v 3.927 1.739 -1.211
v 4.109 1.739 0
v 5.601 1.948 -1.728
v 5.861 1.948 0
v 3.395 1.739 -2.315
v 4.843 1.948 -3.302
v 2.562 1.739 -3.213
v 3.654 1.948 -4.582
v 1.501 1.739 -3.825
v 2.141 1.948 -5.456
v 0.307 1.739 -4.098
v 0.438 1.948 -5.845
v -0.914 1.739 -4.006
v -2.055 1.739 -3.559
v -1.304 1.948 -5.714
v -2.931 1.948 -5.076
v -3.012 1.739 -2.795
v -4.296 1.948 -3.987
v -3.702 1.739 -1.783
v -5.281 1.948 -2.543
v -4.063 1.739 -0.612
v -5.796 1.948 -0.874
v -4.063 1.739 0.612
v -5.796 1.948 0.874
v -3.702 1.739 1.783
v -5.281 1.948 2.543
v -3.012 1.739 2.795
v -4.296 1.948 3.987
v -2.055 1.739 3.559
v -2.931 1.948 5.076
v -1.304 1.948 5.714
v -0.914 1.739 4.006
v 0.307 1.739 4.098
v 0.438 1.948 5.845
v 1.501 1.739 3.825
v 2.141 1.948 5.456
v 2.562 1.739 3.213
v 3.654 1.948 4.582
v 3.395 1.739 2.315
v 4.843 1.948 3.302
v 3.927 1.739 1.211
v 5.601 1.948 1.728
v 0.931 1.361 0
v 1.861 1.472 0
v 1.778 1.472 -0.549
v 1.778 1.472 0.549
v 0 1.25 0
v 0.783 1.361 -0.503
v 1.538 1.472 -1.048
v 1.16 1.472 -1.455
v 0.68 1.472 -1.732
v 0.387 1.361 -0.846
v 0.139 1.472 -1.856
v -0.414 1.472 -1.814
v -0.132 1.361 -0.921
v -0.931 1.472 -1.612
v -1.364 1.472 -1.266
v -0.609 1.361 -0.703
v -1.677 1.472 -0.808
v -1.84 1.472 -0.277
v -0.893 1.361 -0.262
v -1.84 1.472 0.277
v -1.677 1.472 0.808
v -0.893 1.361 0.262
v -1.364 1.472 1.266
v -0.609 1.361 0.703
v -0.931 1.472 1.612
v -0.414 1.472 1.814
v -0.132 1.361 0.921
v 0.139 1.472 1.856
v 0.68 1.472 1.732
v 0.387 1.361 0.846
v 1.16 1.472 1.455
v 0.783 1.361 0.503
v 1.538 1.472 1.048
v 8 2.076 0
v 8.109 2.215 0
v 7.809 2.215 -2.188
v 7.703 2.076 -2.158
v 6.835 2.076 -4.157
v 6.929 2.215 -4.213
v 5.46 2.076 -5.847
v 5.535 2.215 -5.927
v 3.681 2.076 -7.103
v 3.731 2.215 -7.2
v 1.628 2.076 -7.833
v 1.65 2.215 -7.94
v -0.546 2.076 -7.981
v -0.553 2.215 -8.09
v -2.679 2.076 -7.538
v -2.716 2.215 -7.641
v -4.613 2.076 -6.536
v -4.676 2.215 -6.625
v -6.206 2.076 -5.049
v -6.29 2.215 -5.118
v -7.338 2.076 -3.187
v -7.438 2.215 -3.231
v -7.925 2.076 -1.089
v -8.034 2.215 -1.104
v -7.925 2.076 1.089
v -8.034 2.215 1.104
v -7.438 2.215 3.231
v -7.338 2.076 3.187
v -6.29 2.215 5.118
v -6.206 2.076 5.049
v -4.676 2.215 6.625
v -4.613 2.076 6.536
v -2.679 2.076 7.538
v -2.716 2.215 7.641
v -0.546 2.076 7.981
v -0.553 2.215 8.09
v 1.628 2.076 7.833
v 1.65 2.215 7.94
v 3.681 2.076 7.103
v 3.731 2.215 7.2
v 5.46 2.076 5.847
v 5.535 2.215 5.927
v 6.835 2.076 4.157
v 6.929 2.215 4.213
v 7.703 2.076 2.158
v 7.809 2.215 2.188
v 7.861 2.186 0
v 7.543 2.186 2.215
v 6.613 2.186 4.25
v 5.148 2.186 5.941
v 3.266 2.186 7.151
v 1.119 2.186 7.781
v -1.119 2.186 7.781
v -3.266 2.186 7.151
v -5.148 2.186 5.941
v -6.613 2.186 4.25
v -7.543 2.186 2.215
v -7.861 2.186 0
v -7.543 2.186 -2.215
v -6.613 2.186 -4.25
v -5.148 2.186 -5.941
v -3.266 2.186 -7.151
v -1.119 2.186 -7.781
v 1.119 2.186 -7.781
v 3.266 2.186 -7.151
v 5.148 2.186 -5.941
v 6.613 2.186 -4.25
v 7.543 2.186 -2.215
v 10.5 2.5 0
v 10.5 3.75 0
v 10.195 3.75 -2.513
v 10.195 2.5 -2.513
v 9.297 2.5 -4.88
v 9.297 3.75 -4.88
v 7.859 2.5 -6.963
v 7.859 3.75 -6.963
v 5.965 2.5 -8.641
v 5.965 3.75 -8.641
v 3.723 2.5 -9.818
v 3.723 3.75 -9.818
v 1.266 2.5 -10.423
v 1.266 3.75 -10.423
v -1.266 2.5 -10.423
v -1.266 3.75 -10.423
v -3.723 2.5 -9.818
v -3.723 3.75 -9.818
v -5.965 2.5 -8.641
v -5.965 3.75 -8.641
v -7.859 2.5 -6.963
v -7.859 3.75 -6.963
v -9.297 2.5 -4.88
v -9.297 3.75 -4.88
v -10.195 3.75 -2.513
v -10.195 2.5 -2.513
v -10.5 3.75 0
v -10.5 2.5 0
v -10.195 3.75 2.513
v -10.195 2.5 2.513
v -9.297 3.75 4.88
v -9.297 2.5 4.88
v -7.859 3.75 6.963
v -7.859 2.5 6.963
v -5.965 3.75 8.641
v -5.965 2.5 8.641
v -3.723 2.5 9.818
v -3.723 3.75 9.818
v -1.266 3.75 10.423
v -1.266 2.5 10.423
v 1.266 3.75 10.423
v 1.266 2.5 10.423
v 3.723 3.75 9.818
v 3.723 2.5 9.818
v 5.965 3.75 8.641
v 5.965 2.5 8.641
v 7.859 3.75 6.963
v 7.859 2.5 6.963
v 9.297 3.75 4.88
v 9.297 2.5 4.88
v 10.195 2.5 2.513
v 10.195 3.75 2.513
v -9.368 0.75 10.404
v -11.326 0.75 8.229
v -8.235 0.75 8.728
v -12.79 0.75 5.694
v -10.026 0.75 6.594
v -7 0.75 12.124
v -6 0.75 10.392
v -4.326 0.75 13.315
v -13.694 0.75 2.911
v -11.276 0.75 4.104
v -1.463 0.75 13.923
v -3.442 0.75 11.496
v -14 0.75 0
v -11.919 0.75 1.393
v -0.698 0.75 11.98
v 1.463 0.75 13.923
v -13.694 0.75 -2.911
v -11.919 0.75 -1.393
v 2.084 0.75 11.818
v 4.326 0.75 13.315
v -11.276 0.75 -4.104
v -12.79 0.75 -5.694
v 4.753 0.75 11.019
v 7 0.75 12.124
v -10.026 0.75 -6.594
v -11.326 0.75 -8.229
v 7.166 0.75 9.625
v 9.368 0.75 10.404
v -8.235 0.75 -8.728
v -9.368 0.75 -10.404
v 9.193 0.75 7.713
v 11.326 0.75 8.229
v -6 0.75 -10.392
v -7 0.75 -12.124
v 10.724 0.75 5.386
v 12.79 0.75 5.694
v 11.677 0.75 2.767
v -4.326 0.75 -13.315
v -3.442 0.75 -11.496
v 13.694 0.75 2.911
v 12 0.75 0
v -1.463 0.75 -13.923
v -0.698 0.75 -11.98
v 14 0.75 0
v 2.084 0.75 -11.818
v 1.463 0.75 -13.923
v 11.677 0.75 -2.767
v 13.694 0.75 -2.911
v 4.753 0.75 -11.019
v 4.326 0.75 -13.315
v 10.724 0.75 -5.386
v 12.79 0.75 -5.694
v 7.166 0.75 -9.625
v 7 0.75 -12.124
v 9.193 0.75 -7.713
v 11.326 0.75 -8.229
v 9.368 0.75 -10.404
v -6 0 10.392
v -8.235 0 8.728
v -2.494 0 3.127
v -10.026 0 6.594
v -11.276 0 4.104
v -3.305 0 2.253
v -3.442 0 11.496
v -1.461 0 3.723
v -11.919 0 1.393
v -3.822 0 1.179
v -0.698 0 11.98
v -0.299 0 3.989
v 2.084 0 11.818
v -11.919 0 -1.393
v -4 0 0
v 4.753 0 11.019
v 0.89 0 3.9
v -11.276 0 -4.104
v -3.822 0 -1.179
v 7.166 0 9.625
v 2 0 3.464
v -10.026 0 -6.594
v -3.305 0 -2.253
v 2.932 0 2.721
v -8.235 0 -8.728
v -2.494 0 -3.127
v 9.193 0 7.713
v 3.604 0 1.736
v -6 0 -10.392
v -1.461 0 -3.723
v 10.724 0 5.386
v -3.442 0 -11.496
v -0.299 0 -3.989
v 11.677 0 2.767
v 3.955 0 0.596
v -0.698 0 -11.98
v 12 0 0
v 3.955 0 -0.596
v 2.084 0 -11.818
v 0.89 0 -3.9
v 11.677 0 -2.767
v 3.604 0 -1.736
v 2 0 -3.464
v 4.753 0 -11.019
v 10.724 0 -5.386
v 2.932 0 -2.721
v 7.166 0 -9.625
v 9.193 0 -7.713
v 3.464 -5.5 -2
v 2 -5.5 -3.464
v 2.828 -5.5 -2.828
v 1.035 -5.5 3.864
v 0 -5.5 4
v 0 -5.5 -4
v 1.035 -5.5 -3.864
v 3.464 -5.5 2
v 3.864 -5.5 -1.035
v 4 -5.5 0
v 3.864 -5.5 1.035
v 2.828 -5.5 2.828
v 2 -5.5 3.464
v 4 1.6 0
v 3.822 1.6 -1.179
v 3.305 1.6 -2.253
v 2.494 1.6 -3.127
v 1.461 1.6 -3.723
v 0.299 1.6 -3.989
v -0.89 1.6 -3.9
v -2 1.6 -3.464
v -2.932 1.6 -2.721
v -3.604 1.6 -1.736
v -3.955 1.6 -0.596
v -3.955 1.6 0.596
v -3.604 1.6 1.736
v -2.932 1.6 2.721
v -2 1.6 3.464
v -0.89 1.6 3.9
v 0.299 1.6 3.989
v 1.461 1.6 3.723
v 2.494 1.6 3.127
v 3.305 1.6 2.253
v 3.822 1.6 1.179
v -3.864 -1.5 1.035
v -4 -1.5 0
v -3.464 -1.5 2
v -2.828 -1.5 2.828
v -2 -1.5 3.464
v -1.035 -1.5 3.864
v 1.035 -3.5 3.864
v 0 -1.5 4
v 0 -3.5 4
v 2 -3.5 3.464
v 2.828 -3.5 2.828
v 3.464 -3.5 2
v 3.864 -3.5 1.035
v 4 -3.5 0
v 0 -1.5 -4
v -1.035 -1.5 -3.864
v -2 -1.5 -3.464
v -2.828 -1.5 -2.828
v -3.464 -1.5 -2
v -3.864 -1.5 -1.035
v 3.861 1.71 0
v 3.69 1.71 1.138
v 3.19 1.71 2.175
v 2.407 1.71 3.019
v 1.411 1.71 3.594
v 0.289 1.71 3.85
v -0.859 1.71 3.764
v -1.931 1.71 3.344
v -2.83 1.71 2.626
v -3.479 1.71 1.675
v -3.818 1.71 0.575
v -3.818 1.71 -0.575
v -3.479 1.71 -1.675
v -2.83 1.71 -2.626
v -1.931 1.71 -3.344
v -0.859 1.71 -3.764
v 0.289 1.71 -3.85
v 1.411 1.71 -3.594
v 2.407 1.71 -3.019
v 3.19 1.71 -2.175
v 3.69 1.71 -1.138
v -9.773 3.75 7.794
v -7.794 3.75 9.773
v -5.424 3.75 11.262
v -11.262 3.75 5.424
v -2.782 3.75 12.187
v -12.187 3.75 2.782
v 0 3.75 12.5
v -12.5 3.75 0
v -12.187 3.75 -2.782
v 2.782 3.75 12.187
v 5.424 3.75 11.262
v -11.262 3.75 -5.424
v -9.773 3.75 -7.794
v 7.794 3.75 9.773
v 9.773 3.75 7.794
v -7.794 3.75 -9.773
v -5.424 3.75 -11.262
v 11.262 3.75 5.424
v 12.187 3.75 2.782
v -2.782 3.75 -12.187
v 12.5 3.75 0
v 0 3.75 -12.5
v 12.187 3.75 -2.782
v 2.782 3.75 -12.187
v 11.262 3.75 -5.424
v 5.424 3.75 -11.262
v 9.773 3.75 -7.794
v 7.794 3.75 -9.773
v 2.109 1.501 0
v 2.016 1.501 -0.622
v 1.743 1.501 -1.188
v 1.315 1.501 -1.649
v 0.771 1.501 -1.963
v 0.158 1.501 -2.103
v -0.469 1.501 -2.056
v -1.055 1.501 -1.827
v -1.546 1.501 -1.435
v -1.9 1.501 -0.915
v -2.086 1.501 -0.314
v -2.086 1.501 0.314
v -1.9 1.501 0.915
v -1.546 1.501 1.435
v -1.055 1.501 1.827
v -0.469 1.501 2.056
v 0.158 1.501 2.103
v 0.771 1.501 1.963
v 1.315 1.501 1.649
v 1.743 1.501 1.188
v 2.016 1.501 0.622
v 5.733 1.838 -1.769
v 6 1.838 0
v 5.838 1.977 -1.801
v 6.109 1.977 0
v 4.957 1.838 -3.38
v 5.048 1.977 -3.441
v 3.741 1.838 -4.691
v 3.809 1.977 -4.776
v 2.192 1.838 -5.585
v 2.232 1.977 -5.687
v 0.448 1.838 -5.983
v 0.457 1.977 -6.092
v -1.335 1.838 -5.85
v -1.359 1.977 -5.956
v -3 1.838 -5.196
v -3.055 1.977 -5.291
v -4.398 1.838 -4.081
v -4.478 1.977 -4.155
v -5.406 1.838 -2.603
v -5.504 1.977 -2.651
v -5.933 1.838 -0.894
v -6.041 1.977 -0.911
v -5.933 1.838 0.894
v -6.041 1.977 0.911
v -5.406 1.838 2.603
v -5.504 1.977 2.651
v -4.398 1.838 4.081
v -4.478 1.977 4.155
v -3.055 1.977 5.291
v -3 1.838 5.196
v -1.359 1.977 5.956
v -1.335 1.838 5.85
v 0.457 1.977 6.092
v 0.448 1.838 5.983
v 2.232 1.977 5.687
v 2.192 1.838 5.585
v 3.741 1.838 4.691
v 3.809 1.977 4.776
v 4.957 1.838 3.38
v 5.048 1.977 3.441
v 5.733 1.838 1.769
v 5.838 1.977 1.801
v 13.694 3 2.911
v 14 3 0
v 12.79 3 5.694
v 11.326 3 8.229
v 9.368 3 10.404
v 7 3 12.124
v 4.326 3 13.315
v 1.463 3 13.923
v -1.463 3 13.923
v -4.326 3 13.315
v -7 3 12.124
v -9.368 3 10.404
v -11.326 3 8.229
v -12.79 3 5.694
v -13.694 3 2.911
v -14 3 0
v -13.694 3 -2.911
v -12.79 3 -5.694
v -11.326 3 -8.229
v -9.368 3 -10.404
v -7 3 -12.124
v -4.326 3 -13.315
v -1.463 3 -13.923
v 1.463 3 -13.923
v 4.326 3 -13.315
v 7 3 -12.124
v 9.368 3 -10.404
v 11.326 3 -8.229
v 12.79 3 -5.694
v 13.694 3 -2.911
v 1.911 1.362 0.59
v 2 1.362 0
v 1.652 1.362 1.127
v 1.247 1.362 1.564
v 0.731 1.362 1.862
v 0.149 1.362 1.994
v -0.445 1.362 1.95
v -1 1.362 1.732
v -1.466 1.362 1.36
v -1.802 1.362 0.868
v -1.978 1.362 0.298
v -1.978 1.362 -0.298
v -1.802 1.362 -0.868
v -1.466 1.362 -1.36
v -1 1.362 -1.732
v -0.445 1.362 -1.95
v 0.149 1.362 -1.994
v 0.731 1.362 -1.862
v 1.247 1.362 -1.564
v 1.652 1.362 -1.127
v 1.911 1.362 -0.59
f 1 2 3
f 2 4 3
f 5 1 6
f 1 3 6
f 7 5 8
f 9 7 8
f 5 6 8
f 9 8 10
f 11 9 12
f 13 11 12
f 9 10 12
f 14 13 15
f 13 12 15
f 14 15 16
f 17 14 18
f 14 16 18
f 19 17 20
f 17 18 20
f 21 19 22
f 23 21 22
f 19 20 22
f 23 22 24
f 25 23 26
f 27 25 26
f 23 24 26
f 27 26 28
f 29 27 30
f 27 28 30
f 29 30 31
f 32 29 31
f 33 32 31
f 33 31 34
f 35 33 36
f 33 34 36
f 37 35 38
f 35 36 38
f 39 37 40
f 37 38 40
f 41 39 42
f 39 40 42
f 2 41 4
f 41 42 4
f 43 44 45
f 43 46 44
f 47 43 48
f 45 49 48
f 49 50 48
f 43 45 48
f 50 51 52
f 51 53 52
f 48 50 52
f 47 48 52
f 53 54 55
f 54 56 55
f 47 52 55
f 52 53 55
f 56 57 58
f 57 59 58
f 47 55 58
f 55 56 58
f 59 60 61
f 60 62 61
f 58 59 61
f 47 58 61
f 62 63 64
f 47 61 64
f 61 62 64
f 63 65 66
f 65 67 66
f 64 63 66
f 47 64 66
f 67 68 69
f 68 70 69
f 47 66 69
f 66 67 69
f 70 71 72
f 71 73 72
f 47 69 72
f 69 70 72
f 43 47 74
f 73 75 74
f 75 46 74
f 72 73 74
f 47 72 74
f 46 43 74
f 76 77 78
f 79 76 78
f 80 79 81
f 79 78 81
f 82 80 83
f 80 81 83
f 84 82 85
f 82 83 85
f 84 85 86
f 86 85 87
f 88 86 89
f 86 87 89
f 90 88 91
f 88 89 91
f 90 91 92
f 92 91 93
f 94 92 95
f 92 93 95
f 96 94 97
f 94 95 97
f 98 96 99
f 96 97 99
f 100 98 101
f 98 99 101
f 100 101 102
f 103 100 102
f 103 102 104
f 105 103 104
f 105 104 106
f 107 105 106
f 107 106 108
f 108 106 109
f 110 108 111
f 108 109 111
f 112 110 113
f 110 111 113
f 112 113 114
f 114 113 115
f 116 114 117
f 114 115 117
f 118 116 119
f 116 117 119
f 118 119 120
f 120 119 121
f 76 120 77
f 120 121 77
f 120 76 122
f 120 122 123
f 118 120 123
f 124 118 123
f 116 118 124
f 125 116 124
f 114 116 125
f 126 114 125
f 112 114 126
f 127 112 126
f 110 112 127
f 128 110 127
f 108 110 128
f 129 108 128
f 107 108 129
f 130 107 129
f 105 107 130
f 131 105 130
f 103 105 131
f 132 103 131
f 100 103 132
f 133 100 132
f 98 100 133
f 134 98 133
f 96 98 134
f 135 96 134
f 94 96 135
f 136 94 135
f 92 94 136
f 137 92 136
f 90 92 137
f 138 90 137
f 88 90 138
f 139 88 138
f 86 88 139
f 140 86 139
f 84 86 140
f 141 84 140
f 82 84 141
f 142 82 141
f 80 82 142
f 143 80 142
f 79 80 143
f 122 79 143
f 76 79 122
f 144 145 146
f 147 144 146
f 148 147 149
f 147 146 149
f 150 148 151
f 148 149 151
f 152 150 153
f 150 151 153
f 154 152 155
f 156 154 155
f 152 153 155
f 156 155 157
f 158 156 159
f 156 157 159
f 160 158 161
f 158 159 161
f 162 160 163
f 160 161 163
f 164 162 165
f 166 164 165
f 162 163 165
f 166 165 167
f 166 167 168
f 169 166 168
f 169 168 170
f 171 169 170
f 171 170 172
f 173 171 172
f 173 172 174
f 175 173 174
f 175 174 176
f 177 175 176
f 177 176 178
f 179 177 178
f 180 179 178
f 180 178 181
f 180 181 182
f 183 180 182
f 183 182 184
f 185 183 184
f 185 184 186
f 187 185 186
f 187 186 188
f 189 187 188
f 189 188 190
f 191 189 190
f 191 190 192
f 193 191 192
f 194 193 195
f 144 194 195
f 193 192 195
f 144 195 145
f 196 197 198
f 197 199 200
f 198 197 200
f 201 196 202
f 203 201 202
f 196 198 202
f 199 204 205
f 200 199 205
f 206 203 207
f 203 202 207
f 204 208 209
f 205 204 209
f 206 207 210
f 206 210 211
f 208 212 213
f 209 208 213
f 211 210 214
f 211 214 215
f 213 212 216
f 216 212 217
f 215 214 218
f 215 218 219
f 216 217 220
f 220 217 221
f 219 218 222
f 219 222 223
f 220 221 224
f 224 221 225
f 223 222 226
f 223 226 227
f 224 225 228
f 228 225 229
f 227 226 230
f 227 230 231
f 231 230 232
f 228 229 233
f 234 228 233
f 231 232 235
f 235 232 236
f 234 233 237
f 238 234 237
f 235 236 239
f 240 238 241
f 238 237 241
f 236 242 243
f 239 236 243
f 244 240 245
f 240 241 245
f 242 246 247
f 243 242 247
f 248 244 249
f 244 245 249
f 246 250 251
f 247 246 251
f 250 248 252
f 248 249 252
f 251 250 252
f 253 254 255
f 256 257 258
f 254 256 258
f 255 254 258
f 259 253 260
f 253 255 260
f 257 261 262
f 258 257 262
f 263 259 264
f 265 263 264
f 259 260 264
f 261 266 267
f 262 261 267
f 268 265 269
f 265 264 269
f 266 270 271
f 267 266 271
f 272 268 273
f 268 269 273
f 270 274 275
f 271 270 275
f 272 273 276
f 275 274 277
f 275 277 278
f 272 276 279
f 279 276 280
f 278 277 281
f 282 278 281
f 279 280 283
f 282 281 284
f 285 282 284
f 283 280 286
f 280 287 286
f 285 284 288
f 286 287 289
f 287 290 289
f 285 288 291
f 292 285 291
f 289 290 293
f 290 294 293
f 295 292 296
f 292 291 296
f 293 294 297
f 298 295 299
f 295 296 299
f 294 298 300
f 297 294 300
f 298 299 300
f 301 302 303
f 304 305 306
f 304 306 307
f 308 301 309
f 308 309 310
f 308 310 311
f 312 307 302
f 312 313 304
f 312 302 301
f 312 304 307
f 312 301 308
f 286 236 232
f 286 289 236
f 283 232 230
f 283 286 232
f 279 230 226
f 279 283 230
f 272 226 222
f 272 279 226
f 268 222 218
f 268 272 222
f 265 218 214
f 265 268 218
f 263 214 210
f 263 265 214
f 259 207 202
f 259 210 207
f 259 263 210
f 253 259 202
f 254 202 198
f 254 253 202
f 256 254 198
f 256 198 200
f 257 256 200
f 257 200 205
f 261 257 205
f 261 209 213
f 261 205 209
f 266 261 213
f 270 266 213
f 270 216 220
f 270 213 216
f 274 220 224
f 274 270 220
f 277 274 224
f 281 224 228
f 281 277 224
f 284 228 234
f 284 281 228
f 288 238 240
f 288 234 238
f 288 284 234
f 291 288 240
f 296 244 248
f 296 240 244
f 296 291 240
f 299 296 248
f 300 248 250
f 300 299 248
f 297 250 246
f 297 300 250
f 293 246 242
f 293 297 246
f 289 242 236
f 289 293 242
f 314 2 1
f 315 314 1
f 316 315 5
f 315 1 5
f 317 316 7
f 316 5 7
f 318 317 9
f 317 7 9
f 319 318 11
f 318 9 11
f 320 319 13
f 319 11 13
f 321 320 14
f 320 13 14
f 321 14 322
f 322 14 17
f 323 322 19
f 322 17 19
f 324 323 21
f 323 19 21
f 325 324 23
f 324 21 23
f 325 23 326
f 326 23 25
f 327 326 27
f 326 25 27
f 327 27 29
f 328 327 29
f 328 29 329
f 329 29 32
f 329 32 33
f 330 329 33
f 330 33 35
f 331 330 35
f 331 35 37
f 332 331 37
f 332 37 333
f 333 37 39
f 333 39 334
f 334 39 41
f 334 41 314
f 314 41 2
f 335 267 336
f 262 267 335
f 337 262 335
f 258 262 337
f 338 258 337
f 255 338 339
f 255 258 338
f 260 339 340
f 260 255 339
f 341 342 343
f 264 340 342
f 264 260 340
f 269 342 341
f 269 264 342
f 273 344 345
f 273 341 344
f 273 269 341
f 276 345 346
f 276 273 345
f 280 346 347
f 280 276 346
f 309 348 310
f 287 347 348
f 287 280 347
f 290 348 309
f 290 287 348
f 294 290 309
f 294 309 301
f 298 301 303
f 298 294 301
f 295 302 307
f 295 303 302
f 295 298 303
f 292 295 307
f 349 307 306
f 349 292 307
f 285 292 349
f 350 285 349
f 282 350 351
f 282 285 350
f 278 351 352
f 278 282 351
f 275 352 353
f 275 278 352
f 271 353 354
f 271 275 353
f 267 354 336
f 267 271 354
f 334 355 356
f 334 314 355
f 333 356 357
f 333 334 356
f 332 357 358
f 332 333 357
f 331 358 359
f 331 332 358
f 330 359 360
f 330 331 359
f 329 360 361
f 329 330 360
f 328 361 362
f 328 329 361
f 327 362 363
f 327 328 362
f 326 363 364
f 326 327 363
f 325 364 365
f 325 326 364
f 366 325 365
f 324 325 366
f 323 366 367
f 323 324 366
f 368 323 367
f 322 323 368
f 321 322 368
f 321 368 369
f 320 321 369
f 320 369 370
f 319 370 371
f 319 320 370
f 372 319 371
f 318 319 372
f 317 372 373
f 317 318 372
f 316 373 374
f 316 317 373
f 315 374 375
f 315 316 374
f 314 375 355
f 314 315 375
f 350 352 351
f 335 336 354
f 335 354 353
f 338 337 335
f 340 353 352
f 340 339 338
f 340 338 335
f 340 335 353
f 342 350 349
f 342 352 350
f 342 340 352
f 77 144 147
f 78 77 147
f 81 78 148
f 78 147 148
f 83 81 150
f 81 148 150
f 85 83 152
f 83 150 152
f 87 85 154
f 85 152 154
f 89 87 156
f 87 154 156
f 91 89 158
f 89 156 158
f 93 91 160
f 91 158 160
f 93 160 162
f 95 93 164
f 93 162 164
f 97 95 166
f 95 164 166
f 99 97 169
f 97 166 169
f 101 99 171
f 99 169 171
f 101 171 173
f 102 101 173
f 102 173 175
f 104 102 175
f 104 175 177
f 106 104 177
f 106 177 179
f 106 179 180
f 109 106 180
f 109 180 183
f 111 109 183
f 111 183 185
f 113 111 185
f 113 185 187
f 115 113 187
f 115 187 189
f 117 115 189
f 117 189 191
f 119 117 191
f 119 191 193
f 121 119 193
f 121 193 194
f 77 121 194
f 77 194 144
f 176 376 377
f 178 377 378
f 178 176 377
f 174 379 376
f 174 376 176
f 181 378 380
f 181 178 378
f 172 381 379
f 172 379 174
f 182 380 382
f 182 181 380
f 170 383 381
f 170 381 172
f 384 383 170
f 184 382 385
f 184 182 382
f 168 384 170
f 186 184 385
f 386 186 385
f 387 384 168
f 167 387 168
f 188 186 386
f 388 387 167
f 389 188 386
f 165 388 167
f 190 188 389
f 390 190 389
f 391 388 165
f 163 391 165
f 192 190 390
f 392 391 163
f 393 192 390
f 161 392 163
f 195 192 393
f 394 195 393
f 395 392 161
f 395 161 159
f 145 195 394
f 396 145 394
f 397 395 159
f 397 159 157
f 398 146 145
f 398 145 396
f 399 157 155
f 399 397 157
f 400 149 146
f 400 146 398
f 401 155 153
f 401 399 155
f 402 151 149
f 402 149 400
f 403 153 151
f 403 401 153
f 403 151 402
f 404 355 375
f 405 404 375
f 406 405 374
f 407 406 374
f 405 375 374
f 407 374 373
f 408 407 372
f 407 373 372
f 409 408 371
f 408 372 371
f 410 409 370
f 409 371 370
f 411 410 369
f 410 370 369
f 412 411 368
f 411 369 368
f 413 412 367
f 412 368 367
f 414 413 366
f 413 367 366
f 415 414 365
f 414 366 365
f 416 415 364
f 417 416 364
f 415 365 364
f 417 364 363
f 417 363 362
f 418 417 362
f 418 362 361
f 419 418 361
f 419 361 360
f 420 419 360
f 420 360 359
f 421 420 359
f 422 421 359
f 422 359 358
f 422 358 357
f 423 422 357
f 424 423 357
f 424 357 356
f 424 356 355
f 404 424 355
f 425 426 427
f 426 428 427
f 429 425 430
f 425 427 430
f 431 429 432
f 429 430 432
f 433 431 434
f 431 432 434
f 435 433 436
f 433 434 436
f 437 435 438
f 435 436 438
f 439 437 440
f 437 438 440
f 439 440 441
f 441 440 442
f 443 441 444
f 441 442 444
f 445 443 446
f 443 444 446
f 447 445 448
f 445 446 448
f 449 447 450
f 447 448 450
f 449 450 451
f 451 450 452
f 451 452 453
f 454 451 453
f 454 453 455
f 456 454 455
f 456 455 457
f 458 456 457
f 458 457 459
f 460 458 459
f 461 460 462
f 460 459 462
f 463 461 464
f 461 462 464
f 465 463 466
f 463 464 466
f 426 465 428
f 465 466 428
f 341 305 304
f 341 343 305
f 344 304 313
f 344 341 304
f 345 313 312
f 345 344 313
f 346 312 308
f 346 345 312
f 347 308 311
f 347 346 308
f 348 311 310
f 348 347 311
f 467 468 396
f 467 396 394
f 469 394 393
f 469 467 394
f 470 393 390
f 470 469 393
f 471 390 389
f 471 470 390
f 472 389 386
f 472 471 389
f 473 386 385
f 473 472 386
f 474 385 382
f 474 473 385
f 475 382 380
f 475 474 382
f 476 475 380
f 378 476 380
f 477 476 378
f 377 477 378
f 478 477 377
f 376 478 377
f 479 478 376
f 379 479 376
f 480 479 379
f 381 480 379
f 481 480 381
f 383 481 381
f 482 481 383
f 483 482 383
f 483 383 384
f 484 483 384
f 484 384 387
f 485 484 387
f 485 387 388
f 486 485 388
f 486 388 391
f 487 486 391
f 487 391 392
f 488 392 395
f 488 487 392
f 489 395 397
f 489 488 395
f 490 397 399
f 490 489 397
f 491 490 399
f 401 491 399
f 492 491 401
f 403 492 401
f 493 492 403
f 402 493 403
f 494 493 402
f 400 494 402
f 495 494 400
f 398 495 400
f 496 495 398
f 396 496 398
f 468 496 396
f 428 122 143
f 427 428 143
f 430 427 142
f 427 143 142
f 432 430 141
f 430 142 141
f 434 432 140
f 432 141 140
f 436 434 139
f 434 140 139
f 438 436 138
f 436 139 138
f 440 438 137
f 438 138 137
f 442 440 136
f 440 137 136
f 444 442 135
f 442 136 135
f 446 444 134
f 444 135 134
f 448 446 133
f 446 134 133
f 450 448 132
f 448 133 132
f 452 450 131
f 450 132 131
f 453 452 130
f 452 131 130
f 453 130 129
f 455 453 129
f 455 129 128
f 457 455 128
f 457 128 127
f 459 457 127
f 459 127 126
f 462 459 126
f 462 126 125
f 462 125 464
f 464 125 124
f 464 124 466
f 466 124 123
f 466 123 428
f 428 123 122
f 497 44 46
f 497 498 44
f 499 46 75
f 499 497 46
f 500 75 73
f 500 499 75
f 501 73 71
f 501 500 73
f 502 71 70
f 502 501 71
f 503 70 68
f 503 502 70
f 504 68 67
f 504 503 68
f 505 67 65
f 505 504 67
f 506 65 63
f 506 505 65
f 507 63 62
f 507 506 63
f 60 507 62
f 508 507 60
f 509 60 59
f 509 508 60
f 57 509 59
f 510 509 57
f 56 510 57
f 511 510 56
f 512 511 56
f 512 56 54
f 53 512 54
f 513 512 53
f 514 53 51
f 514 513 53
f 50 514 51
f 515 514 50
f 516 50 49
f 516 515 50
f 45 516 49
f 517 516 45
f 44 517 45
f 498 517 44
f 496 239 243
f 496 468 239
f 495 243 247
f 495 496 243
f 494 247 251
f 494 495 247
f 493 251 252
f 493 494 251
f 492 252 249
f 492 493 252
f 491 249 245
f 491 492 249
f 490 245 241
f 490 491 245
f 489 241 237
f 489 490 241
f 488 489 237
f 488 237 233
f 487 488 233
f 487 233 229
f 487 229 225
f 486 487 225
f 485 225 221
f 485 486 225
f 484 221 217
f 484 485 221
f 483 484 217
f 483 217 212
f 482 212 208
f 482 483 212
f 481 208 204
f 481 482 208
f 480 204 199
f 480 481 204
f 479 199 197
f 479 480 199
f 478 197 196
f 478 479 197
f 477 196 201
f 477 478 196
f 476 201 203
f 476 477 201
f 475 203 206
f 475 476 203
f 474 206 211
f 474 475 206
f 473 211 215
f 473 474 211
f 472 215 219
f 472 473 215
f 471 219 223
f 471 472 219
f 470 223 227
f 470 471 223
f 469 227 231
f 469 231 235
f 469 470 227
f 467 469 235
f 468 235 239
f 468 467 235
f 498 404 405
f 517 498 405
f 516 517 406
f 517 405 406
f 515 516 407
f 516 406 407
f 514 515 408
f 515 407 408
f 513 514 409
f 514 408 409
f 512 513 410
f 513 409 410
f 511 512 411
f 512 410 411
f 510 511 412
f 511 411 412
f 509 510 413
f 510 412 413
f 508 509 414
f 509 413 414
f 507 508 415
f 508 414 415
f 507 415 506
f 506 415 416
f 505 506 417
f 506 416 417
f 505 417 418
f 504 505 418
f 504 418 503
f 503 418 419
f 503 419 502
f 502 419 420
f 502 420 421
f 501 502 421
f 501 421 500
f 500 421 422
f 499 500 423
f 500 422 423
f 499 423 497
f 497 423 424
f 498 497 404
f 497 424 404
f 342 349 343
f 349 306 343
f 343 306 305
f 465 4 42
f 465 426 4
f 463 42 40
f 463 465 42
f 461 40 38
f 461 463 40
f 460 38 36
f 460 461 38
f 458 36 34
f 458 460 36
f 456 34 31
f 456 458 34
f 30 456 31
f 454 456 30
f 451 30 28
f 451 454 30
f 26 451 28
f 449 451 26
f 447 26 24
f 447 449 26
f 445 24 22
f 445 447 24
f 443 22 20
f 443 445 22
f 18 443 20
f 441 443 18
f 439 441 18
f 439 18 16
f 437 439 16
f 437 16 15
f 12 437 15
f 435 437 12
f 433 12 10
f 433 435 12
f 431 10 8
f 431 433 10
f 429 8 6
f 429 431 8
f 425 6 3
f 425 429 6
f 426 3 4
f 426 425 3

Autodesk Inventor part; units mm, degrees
ref_plane "YZ Plane" through (0, 0, 0) normal (1, 0, 0) x (0, 1, 0)
ref_plane "XZ Plane" through (0, 0, 0) normal (0, 1, 0) x (-1, 0, 0)
ref_plane "XY Plane" through (0, 0, 0) normal (0, 0, 1) x (1, 0, 0)
sketch "Sketch1" plane through (0, 0, 0) normal (0, 1, 0) x (-1, 0, 0)
  circle A0 centre (0, 0) radius 4
  line L0 (0, 0) -> (4, 0) construction
  line L1 (0, 0) -> (0, -4) construction
  line L2 (0, 0) -> (-4, 0) construction
  line L3 (0, 0) -> (0, 4) construction
  dimension "d0" = 8
extrude "Extrusion1" add sketch "Sketch1" against normal blind 3.5
ref_plane "Work Plane1" through (0, 0, 0) normal (0, 0, 1) x (1, 0, 0)
sketch "Sketch2" plane through (0, 0, 0) normal (0, 0, 1) x (1, 0, 0)
  line L0 (-4, 0) -> (4, 0) projected
  line L1 (4, 0) -> (12, 0)
  line L2 (14, 0.75) -> (14, 3)
  line L3 (12.5, 3.75) -> (10.5, 3.75)
  line L4 (0, 0) -> (0, 1.25)
  line L5 (4, 0) -> (4, 1.5959) construction
  line L6 (14, 0.75) -> (12, 0.75)
  line L7 (12, 0.75) -> (12, 0)
  line L8 (14, 3) -> (12.5, 3.75)
  line L9 (10.5, 2.5) -> (10.5, 3.75)
  line L10 (5.8611, 1.9477) -> (6, 1.8384)
  line L11 (6, 1.8384) -> (6.1093, 1.9773)
  line L12 (4.1093, 1.7392) -> (4, 1.6003)
  line L13 (4, 1.6003) -> (3.8611, 1.7097)
  line L14 (1.8611, 1.4716) -> (2, 1.3622)
  line L15 (2, 1.3622) -> (2.1093, 1.5011)
  line L16 (0, 1.25) -> (1.8611, 1.4716)
  line L17 (2.1093, 1.5011) -> (3.8611, 1.7097)
  line L18 (4.1093, 1.7392) -> (5.8611, 1.9477)
  line L19 (4, 1.6003) -> (4, 3.125) construction
  line L20 (6, 1.8384) -> (6, 3.125) construction
  line L21 (10.5, 3.125) -> (6, 3.125) construction
  line L22 (6, 3.125) -> (4, 3.125) construction
  line L23 (4, 3.125) -> (2, 3.125) construction
  line L24 (2, 3.125) -> (0, 3.125) construction
  line L25 (1.8611, 1.4716) -> (2.1093, 1.5011) construction
  line L26 (3.8611, 1.7097) -> (4.1093, 1.7392) construction
  line L27 (5.8611, 1.9477) -> (6.1093, 1.9773) construction
  line L28 (1.9852, 1.4863) -> (2, 1.3622) construction
  line L29 (4, 1.7262) -> (4, 1.6003) construction
  line L30 (2, 1.3622) -> (2, 3.125) construction
  line L31 (7.8611, 2.1858) -> (8, 2.0765)
  line L32 (8, 2.0765) -> (8.1093, 2.2154)
  line L33 (8, 2.0765) -> (8, 3.125) construction
  line L34 (6.1093, 1.9773) -> (7.8611, 2.1858)
  line L35 (8.1093, 2.2154) -> (10.5, 2.5)
  point P0 (6, 1.9643)
  dimension "d8" = 14
  dimension "d11" = 12
  dimension "d12" = 0.75
  dimension "d13" = 3
  dimension "d14" = 0.75
  dimension "d15" = 1.5
  dimension "d16" = 1.25
  dimension "d19" = 3.5
  dimension "d23" = 1.25
  dimension "d24" = 2
  dimension "d25" = 0.125
  dimension "d26" = 2
  dimension "d27" = 2
revolve "Revolution1" add sketch "Sketch2" angle 360 about axis through (0, 0, 0) along (0, 1, 0)
sketch "Sketch3" plane through (0, -3.5, 0) normal (0, -1, 0) x (1, 0, 0)
  point P0 (0, 0)
  point P1 (0, 0)
sketch "Sketch4" plane through (0, -3.5, 0) normal (0, -1, 0) x (1, 0, 0)
  circle A0 centre (0, 0) radius 4 projected
  circle A1 centre (0, 0) radius 4 projected
  arc A2 (0, -4) -> (0, 4) centre (0, 0) ccw
  line L0 (0, 4) -> (0, -4)
extrude "Extrusion2" add sketch "Sketch4" along normal blind 2 contours A0 L0 picked at (0.5785, 1.2013)
sketch "Sketch5" plane through (0, -3.5, 0) normal (0, -1, 0) x (1, 0, 0)
  line L0 (0, -4) -> (0, 4) projected
  arc A0 (0, 4) -> (0, -4) centre (0, 0) ccw projected
extrude "Extrusion3" cut sketch "Sketch5" against normal blind 2
properties part number "Caps 8mm Square Rounded Caps Male"
